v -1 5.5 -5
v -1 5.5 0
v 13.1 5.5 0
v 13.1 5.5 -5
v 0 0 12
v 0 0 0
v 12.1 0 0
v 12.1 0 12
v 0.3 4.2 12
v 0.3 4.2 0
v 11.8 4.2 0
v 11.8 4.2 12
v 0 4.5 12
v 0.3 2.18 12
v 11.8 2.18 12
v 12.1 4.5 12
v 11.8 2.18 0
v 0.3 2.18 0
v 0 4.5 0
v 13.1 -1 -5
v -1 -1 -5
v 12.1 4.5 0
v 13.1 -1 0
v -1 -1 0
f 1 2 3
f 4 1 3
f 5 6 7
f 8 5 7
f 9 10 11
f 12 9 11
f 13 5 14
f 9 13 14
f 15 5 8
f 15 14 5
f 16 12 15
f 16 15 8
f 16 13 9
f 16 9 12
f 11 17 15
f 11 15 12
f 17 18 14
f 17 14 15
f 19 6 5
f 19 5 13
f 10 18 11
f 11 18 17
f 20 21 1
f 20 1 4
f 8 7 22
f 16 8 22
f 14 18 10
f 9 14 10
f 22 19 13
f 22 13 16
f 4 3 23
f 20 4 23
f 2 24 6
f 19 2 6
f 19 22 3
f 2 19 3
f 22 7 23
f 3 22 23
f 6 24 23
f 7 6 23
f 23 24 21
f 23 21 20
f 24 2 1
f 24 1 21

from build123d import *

# Parameters (mm, degrees)
F0_W     = 12.1
F0_H     = 4.5
F0_W_2   = 11.5
F0_H_2   = 3.9
F1_DEPTH = 12
F2_W     = 11.5
F2_H     = 1.88
F3_DEPTH = 12
F4_W     = 14.16
F4_H     = 6.56
F4_W_2   = 12.1
F4_H_2   = 4.5
F5_DEPTH = 5
F7_W     = 14.1
F7_H     = 6.5
F8_DEPTH = 5


with BuildPart() as f1:
    # F0 (on Top) → F1 (new body)
    with BuildSketch(Plane.XY):
        with Locations((6.05, 2.25)):
            Rectangle(F0_W, F0_H)
        with Locations((6.05, 2.25)):
            Rectangle(F0_W_2, F0_H_2, mode=Mode.SUBTRACT)
    extrude(amount=F1_DEPTH)

    # F2 (on Top) → F3 (join)
    with BuildSketch(Plane.XY):
        with Locations((6.05, 1.24)):
            Rectangle(F2_W, F2_H)
    extrude(amount=F3_DEPTH)

    # F7 (on face) → F8 (join)
    with BuildSketch(Plane(origin=(0, 0, 0), x_dir=(1, 0, 0), z_dir=(0, 0, -1))):
        with Locations((6.05, -2.25)):
            Rectangle(F7_W, F7_H)
    extrude(amount=F8_DEPTH)


with BuildPart() as f5:
    # F4 (on face) → F5 (new body)
    with BuildSketch(Plane(origin=(0, 0, 0), x_dir=(1, 0, 0), z_dir=(0, 0, -1))):
        with Locations((6.05, -2.25)):
            Rectangle(F4_W, F4_H)
        with Locations((6.05, -2.25)):
            Rectangle(F4_W_2, F4_H_2, mode=Mode.SUBTRACT)
    extrude(amount=F5_DEPTH)


solid = f1.part
